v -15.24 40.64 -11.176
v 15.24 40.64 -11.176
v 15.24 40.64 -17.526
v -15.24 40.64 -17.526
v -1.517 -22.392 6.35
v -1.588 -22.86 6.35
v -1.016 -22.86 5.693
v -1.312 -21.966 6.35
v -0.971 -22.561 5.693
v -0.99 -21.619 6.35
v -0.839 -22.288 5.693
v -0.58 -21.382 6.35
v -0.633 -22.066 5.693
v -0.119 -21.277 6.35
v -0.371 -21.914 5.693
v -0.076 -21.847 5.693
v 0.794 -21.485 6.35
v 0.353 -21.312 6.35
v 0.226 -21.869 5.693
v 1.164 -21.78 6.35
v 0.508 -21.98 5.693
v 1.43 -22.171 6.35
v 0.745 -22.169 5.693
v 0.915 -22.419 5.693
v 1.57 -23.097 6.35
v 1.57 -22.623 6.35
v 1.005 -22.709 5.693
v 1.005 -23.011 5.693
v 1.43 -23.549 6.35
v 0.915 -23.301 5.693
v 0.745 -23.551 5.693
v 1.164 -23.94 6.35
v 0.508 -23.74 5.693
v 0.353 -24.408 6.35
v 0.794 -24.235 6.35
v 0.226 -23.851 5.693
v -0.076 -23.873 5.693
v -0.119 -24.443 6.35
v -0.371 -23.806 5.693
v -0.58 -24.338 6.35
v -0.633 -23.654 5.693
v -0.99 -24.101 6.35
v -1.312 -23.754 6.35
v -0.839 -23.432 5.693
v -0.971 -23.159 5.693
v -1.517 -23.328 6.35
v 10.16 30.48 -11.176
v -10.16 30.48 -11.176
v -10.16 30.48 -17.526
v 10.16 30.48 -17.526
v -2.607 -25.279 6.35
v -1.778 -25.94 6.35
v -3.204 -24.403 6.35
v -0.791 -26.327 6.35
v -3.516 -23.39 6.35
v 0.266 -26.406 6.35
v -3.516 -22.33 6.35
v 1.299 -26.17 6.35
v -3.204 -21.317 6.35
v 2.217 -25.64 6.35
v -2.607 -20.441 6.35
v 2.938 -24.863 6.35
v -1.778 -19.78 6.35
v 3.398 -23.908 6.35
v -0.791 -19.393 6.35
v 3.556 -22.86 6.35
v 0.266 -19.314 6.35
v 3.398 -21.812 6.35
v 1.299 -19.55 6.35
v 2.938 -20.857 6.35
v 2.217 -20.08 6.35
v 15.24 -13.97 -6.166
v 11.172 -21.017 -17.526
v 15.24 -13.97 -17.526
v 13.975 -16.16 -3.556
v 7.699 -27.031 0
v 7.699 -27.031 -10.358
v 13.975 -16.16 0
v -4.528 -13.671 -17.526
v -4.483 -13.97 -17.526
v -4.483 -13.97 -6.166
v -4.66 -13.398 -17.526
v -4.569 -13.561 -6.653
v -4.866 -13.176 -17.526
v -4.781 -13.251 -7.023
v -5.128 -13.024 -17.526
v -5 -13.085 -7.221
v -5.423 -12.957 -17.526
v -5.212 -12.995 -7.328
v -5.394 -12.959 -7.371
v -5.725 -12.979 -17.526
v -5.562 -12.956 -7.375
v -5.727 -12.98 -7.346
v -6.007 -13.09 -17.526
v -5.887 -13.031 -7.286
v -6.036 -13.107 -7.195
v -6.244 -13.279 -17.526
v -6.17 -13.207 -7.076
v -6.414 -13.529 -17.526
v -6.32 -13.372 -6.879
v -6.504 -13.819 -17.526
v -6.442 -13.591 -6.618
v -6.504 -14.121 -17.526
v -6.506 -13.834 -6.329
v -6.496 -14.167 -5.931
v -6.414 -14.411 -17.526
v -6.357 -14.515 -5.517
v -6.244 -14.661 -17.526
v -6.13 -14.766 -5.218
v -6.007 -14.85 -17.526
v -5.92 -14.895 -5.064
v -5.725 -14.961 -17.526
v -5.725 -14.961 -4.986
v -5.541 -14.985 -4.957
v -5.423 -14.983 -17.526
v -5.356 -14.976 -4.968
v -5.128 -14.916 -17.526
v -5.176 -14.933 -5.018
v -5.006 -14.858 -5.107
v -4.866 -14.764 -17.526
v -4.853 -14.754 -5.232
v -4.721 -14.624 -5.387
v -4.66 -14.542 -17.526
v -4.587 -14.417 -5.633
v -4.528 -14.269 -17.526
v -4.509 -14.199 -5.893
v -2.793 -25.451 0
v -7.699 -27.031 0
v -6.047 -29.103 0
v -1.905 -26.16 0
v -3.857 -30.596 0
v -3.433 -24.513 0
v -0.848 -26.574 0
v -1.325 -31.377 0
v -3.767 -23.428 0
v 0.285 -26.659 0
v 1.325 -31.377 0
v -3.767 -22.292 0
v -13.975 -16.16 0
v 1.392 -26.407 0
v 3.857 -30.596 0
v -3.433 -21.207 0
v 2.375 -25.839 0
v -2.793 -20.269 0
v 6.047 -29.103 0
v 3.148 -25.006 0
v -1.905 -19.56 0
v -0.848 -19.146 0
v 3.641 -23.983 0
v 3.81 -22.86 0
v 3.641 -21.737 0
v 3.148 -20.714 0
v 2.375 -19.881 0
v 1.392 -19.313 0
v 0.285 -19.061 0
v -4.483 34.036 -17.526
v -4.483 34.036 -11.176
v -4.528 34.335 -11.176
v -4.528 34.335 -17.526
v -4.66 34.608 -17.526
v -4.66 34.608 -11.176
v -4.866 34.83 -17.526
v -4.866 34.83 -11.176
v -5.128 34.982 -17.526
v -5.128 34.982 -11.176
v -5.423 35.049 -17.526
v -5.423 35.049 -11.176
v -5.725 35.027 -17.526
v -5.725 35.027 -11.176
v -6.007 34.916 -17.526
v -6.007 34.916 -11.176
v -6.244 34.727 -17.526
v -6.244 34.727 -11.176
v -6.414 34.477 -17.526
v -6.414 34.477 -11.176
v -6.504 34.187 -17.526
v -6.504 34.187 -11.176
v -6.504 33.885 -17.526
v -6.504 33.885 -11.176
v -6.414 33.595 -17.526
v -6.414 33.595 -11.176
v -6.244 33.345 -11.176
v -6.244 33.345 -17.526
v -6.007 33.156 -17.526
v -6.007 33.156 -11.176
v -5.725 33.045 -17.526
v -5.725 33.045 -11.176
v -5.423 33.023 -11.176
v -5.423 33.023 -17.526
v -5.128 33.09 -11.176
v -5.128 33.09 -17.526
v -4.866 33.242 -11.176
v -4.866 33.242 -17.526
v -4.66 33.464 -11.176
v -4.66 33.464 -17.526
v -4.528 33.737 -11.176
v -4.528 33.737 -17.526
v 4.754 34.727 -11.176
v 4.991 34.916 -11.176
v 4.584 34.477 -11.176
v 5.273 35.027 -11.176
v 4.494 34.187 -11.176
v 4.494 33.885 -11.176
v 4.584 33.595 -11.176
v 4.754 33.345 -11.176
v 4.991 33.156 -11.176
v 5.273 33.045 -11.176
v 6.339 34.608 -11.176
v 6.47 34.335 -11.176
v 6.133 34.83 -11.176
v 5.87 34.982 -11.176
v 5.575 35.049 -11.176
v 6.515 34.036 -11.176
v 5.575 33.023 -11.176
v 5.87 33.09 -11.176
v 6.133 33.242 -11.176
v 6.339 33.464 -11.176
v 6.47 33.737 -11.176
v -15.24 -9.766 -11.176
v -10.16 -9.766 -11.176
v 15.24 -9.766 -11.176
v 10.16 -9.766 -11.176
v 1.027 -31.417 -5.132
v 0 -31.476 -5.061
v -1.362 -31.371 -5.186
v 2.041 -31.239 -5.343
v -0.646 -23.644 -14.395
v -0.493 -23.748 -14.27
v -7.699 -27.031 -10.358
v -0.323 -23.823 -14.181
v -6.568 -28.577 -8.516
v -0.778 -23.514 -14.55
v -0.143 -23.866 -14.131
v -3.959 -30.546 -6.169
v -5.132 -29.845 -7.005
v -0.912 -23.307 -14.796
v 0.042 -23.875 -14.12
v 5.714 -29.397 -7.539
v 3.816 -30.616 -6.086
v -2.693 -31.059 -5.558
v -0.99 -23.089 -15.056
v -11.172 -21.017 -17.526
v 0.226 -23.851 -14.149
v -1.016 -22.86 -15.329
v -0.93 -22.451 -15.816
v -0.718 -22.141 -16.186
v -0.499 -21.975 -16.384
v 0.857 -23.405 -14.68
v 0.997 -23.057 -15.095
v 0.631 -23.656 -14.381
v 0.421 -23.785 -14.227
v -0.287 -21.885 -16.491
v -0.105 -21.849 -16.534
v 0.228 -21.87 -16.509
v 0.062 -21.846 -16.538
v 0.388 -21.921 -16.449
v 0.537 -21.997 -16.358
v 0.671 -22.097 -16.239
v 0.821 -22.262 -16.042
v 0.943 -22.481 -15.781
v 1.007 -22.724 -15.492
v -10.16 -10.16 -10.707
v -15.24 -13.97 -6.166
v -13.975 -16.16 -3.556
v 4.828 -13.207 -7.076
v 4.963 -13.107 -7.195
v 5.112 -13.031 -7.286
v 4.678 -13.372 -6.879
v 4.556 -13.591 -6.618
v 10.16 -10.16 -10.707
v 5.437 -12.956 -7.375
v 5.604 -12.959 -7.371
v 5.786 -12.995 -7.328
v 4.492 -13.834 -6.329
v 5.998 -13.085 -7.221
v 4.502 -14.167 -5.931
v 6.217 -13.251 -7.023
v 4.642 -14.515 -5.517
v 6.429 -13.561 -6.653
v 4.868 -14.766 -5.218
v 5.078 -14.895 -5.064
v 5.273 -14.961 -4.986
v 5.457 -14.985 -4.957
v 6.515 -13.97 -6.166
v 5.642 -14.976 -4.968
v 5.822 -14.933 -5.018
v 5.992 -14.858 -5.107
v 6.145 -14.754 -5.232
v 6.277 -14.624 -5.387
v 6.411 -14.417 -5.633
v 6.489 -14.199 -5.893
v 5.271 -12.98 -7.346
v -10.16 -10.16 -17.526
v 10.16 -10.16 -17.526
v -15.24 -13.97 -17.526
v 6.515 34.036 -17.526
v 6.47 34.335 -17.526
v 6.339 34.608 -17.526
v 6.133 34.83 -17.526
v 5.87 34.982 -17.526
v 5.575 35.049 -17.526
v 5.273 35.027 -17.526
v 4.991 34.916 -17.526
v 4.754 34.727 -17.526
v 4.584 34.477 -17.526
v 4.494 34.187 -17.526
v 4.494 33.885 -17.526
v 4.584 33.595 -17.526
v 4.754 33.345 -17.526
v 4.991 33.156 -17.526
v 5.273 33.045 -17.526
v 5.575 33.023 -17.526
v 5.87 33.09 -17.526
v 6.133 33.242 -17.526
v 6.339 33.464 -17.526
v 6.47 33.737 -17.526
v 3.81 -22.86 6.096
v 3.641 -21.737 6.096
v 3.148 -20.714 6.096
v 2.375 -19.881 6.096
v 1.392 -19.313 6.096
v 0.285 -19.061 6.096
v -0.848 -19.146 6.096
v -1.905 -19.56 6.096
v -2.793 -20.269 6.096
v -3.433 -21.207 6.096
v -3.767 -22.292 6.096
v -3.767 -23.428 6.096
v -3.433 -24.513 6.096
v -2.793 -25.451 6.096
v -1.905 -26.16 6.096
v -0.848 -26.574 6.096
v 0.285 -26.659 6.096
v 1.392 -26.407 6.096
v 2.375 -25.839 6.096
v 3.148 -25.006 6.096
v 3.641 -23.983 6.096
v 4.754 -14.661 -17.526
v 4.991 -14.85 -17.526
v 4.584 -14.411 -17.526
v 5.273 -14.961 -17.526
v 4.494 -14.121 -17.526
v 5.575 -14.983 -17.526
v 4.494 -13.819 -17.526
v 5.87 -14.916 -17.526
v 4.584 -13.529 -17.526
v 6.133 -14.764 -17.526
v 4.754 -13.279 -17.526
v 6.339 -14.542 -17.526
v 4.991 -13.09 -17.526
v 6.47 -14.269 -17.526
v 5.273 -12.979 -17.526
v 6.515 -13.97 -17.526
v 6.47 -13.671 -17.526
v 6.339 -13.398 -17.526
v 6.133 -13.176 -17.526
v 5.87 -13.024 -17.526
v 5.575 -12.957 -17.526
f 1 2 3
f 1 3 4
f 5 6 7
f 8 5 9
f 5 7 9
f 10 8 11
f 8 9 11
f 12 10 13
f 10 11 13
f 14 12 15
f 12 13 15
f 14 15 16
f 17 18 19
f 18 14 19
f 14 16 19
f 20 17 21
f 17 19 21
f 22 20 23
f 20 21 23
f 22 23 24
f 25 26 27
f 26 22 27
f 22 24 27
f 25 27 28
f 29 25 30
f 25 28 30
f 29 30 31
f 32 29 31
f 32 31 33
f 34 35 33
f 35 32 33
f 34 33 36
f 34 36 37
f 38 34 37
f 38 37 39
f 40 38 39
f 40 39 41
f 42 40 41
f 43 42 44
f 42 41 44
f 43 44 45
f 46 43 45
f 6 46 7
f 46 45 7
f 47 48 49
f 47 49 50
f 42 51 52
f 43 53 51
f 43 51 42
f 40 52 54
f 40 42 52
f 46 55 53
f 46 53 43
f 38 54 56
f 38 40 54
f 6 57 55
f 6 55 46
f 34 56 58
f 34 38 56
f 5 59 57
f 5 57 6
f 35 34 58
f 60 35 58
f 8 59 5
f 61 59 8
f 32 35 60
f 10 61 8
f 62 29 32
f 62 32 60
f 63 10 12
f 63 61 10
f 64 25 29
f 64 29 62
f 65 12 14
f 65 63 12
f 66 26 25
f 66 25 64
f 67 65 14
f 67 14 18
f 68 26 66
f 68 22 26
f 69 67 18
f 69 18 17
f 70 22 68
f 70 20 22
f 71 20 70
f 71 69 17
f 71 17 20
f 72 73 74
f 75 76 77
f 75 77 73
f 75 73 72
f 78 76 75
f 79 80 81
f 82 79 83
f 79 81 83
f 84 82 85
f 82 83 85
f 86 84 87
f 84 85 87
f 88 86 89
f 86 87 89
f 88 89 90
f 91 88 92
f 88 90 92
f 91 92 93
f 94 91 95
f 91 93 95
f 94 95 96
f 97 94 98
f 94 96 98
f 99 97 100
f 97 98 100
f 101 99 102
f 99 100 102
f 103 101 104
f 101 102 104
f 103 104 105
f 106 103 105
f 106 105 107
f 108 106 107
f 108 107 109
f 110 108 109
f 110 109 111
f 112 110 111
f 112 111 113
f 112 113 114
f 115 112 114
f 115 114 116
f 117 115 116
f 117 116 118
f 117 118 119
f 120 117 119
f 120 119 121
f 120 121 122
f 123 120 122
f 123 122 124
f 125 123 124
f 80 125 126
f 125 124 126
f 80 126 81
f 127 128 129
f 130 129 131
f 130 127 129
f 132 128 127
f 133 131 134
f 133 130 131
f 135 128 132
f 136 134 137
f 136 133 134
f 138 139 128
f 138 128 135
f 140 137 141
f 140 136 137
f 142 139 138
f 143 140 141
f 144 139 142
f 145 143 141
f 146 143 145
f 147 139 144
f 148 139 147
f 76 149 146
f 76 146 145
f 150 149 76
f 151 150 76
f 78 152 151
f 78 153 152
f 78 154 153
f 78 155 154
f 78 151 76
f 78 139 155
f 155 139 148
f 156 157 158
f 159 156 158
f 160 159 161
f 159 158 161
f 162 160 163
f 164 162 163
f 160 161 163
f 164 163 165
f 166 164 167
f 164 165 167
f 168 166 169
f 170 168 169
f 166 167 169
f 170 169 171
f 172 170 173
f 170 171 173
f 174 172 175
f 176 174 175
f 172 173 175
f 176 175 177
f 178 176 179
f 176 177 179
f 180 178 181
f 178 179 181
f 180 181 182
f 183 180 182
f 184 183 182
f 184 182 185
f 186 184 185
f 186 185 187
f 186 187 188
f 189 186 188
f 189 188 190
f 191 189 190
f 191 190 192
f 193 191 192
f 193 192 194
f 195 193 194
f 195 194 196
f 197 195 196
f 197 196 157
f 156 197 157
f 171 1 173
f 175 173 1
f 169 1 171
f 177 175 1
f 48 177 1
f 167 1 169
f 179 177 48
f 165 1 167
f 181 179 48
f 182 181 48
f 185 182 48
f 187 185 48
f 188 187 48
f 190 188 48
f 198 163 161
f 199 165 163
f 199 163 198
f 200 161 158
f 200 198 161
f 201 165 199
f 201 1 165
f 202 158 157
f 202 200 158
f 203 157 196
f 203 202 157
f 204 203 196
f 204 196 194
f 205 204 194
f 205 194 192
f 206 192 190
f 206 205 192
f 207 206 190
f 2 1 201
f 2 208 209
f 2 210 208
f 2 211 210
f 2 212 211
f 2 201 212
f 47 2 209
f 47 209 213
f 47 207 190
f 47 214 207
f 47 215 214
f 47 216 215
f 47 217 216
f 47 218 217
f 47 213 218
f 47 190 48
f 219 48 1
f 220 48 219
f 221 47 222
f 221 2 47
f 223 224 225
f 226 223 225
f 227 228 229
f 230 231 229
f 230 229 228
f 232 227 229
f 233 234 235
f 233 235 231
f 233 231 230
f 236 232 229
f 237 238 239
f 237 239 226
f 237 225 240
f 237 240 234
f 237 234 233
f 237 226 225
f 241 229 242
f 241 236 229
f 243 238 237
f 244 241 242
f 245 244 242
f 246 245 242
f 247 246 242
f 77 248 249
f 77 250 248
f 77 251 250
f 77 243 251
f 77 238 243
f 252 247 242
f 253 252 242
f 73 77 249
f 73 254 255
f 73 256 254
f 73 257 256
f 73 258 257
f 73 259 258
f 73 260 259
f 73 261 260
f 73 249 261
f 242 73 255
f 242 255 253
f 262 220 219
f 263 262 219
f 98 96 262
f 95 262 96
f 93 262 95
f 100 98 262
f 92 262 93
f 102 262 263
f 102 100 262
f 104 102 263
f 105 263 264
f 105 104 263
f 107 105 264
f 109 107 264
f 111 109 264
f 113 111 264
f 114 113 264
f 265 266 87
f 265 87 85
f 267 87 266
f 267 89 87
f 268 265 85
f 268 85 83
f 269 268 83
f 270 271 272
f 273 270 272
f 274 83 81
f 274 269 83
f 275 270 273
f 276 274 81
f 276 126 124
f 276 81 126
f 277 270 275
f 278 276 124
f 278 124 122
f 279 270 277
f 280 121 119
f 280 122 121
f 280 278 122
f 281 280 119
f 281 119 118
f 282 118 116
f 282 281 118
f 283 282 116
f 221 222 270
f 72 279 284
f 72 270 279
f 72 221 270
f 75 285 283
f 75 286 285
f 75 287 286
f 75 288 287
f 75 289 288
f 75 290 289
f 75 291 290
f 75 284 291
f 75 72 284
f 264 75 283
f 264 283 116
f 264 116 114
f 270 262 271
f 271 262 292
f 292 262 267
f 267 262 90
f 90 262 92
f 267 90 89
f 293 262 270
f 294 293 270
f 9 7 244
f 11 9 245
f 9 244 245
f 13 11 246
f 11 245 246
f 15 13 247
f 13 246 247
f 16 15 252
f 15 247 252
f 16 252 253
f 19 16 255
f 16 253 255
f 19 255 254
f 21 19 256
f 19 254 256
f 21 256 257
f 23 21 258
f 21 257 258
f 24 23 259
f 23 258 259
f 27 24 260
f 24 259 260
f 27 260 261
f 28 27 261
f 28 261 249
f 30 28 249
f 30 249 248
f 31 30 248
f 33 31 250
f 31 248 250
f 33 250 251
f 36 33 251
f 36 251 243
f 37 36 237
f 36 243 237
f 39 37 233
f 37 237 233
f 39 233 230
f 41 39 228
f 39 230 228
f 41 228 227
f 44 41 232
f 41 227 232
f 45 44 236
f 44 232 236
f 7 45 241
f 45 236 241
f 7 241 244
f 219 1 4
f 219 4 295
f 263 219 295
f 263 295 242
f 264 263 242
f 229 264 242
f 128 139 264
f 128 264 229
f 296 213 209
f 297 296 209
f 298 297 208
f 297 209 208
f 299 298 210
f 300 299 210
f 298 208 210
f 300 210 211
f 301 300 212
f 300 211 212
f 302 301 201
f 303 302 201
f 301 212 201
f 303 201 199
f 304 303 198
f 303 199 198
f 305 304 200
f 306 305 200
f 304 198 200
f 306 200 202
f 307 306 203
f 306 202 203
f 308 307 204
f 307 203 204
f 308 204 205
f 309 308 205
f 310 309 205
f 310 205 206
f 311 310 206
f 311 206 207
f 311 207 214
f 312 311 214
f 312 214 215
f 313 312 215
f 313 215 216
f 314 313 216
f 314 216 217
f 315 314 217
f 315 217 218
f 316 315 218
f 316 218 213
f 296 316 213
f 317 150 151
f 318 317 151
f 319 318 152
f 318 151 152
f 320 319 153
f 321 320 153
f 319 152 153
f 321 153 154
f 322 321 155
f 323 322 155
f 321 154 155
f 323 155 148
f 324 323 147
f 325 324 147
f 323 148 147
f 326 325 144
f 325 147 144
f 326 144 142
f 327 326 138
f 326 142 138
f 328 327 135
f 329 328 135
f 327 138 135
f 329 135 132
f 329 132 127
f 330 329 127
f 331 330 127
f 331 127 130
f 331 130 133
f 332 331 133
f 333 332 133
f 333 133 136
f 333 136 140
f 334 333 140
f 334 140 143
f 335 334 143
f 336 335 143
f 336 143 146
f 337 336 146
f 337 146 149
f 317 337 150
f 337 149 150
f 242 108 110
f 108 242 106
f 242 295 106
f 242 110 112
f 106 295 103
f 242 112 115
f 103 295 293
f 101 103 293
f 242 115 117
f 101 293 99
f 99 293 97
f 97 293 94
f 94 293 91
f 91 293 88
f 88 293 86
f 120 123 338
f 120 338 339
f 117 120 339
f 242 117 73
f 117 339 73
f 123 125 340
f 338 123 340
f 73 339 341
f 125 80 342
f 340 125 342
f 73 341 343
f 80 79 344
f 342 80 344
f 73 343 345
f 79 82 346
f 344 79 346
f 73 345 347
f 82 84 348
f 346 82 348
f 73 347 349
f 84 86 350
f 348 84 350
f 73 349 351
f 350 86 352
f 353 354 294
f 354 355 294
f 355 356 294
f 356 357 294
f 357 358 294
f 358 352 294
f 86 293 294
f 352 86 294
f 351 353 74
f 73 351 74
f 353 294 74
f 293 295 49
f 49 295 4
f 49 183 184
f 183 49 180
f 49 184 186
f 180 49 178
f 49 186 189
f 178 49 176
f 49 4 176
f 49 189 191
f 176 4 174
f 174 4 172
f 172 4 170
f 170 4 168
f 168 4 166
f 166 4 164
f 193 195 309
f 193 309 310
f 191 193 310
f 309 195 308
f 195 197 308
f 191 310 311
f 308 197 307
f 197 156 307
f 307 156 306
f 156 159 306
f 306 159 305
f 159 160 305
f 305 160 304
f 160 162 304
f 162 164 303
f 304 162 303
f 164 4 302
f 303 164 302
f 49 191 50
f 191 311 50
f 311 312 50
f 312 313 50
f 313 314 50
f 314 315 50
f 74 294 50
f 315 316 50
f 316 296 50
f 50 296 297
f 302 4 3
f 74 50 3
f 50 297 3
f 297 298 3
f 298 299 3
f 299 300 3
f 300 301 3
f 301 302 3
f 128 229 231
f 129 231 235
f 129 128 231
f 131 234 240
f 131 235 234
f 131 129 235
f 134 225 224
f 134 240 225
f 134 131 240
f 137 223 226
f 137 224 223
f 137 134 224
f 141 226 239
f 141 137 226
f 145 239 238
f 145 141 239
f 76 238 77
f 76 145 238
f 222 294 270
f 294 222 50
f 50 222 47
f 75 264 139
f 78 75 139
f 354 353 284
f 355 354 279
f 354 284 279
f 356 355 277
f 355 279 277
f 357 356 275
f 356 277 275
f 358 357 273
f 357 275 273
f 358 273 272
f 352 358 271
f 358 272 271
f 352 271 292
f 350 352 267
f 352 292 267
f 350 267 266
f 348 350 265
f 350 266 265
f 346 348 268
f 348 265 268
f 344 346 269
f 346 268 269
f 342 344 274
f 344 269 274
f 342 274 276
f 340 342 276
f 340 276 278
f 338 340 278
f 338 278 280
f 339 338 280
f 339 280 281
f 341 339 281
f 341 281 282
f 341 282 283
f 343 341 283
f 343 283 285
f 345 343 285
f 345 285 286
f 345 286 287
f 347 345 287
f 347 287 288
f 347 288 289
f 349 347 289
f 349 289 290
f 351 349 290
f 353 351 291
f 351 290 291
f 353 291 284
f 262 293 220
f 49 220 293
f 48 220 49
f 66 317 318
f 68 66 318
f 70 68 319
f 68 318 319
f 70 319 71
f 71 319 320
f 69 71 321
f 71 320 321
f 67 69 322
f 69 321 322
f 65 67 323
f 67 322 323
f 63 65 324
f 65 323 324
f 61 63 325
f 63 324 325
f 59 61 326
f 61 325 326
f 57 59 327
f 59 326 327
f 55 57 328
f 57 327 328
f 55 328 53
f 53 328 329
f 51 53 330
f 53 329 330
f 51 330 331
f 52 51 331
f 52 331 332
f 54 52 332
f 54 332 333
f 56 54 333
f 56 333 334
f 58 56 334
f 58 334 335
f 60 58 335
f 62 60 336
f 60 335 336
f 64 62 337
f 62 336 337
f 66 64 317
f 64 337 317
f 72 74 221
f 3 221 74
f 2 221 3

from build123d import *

# Parameters (mm, degrees)
F0_R           = 1.016
F0_W           = 20.32
F0_H           = 40.64
F2_DEPTH       = 17.526
F3_DEPTH       = 63.5
F4_R           = 3.81
F5_DEPTH       = 6.35
F7_D           = 2.032
F7_CSINK_D     = 3.175
F7_CSINK_ANGLE = 82
F8_SIZE        = 0.254


with BuildPart() as f2:
    # F0 (on Top) → F2 (new body, through all)
    with BuildSketch(Plane.XY):
        with BuildLine():
            Line((15.24, 40.64), (-15.24, 40.64))
            Line((-15.24, 40.64), (-15.24, -13.97))
            Line((-15.24, -13.97), (-7.698966, -27.031454))
            ThreePointArc((-7.698966, -27.031454), (0, -31.476454), (7.698966, -27.031454))
            Line((7.698966, -27.031454), (15.24, -13.97))
            Line((15.24, -13.97), (15.24, 40.64))
        make_face()
        with Locations((-5.4991, -13.97)):
            Circle(F0_R, mode=Mode.SUBTRACT)
        with Locations((5.4991, -13.97)):
            Circle(F0_R, mode=Mode.SUBTRACT)
        with Locations((-5.4991, 34.036)):
            Circle(F0_R, mode=Mode.SUBTRACT)
        with Locations((0, 10.16)):
            Rectangle(F0_W, F0_H, mode=Mode.SUBTRACT)
        with Locations((5.4991, 34.036)):
            Circle(F0_R, mode=Mode.SUBTRACT)
    extrude(amount=-F2_DEPTH)

    # F1 (on Right) → F3 (intersect, symmetric)
    with BuildSketch(Plane.YZ):
        Polygon((-16.160291, 0), (-31.476454, 0), (-31.476454, -5.0606), (-21.016742, -17.526), (40.64, -17.526), (40.64, -11.176), (-9.766352, -11.176), (-16.160291, -3.556), align=None)
    extrude(amount=F3_DEPTH, both=True, mode=Mode.INTERSECT)

    # F4 (on face) → F5 (join)
    with BuildSketch(Plane.XY):
        with Locations((0, -22.86)):
            Circle(F4_R)
    extrude(amount=F5_DEPTH)

    # F7 (through all)
    with Locations(Plane.XY.offset(6.35)):
        with Locations((0, -22.86)):
            CounterSinkHole(F7_D / 2, F7_CSINK_D / 2, counter_sink_angle=F7_CSINK_ANGLE)

    # F8
    f8_edges = [f2.edges().sort_by_distance(p)[0] for p in [
        (-3.81, -22.86, 6.35),
    ]]
    chamfer(f8_edges, length=F8_SIZE)


solid = f2.part
